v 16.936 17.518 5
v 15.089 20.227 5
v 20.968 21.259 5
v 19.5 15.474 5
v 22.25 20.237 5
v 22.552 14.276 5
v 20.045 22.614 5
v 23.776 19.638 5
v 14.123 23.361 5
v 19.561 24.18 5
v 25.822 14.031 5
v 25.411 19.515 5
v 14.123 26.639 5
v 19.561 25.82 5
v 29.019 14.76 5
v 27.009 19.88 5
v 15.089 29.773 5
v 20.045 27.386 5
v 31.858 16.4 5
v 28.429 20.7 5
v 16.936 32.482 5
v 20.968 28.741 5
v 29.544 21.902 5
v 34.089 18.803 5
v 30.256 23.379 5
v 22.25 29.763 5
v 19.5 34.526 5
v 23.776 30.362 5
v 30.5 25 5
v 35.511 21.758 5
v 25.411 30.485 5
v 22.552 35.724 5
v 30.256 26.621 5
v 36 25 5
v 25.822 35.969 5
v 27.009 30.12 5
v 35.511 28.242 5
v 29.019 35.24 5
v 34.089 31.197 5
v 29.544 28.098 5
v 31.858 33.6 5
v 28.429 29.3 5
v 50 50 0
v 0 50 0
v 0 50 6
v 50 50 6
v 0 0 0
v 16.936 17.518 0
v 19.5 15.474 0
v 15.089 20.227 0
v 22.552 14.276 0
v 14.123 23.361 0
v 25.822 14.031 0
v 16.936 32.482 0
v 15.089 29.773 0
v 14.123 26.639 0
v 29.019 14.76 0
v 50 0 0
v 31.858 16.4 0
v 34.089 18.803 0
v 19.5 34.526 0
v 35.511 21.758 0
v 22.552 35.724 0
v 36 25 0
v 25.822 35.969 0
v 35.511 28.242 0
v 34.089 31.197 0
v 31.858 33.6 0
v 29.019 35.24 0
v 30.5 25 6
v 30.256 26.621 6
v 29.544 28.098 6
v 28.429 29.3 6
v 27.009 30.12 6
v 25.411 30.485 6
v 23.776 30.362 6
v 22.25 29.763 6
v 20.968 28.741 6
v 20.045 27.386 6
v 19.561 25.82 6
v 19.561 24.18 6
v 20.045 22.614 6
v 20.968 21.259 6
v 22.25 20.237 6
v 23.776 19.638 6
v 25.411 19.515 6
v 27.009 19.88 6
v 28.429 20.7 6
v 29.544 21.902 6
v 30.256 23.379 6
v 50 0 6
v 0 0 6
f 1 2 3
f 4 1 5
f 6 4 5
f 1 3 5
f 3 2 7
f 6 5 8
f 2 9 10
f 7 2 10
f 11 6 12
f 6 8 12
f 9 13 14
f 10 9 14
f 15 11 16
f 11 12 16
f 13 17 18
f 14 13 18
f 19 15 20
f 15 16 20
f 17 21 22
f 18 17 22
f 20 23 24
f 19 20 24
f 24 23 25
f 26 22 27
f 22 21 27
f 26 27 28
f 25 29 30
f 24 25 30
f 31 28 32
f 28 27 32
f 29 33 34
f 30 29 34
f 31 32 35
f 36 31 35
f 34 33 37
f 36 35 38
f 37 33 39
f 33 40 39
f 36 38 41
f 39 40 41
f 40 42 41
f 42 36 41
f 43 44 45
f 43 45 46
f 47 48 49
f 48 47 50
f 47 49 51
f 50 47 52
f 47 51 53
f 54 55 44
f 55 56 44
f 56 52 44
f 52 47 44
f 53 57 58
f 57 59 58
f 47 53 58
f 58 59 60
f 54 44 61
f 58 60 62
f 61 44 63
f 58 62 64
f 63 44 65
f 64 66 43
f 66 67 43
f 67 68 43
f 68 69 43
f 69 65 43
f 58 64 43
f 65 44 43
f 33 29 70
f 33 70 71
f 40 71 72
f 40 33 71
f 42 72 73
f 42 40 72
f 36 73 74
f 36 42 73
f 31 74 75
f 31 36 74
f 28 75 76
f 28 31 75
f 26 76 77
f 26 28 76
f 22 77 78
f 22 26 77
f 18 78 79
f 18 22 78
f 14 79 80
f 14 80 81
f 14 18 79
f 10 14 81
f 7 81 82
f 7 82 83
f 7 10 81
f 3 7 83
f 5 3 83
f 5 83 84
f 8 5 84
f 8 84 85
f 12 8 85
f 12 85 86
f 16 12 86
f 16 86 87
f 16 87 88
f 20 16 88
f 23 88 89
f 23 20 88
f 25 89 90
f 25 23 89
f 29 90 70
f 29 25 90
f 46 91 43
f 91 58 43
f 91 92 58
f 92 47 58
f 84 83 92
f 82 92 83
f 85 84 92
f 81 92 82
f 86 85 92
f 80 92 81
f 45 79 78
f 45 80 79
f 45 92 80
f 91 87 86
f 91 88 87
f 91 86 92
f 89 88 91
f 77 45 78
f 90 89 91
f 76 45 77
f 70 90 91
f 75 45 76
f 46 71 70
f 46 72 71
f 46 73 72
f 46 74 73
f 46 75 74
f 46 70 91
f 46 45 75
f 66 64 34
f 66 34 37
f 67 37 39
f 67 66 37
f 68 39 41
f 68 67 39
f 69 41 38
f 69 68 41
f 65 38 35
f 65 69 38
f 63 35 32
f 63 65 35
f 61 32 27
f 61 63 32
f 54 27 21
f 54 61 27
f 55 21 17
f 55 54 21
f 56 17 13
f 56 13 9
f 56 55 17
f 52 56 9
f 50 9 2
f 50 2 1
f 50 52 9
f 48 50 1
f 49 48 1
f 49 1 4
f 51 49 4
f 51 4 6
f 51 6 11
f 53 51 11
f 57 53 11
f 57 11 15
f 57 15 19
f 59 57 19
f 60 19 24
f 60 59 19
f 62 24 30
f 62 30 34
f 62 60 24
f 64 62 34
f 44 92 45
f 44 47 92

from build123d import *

# Parameters (mm, degrees)
SKETCH_W     = 50
SKETCH_H     = 50
SKETCH_R     = 11
PAD_DEPTH    = 5
SKETCH001_W  = 50
SKETCH001_H  = 50
SKETCH001_R  = 5.5
PAD001_DEPTH = 1


with BuildPart() as part:
    # Sketch → Pad (new body)
    with BuildSketch(Plane.XY):
        with Locations((25, 25)):
            Rectangle(SKETCH_W, SKETCH_H)
        with Locations((25, 25)):
            Circle(SKETCH_R, mode=Mode.SUBTRACT)
    extrude(amount=PAD_DEPTH)

    # Sketch001 → Pad001 (new body)
    with BuildSketch(Plane.XY.offset(5)):
        with Locations((25, 25)):
            Rectangle(SKETCH001_W, SKETCH001_H)
        with Locations((25, 25)):
            Circle(SKETCH001_R, mode=Mode.SUBTRACT)
    extrude(amount=PAD001_DEPTH)


solid = part.part
